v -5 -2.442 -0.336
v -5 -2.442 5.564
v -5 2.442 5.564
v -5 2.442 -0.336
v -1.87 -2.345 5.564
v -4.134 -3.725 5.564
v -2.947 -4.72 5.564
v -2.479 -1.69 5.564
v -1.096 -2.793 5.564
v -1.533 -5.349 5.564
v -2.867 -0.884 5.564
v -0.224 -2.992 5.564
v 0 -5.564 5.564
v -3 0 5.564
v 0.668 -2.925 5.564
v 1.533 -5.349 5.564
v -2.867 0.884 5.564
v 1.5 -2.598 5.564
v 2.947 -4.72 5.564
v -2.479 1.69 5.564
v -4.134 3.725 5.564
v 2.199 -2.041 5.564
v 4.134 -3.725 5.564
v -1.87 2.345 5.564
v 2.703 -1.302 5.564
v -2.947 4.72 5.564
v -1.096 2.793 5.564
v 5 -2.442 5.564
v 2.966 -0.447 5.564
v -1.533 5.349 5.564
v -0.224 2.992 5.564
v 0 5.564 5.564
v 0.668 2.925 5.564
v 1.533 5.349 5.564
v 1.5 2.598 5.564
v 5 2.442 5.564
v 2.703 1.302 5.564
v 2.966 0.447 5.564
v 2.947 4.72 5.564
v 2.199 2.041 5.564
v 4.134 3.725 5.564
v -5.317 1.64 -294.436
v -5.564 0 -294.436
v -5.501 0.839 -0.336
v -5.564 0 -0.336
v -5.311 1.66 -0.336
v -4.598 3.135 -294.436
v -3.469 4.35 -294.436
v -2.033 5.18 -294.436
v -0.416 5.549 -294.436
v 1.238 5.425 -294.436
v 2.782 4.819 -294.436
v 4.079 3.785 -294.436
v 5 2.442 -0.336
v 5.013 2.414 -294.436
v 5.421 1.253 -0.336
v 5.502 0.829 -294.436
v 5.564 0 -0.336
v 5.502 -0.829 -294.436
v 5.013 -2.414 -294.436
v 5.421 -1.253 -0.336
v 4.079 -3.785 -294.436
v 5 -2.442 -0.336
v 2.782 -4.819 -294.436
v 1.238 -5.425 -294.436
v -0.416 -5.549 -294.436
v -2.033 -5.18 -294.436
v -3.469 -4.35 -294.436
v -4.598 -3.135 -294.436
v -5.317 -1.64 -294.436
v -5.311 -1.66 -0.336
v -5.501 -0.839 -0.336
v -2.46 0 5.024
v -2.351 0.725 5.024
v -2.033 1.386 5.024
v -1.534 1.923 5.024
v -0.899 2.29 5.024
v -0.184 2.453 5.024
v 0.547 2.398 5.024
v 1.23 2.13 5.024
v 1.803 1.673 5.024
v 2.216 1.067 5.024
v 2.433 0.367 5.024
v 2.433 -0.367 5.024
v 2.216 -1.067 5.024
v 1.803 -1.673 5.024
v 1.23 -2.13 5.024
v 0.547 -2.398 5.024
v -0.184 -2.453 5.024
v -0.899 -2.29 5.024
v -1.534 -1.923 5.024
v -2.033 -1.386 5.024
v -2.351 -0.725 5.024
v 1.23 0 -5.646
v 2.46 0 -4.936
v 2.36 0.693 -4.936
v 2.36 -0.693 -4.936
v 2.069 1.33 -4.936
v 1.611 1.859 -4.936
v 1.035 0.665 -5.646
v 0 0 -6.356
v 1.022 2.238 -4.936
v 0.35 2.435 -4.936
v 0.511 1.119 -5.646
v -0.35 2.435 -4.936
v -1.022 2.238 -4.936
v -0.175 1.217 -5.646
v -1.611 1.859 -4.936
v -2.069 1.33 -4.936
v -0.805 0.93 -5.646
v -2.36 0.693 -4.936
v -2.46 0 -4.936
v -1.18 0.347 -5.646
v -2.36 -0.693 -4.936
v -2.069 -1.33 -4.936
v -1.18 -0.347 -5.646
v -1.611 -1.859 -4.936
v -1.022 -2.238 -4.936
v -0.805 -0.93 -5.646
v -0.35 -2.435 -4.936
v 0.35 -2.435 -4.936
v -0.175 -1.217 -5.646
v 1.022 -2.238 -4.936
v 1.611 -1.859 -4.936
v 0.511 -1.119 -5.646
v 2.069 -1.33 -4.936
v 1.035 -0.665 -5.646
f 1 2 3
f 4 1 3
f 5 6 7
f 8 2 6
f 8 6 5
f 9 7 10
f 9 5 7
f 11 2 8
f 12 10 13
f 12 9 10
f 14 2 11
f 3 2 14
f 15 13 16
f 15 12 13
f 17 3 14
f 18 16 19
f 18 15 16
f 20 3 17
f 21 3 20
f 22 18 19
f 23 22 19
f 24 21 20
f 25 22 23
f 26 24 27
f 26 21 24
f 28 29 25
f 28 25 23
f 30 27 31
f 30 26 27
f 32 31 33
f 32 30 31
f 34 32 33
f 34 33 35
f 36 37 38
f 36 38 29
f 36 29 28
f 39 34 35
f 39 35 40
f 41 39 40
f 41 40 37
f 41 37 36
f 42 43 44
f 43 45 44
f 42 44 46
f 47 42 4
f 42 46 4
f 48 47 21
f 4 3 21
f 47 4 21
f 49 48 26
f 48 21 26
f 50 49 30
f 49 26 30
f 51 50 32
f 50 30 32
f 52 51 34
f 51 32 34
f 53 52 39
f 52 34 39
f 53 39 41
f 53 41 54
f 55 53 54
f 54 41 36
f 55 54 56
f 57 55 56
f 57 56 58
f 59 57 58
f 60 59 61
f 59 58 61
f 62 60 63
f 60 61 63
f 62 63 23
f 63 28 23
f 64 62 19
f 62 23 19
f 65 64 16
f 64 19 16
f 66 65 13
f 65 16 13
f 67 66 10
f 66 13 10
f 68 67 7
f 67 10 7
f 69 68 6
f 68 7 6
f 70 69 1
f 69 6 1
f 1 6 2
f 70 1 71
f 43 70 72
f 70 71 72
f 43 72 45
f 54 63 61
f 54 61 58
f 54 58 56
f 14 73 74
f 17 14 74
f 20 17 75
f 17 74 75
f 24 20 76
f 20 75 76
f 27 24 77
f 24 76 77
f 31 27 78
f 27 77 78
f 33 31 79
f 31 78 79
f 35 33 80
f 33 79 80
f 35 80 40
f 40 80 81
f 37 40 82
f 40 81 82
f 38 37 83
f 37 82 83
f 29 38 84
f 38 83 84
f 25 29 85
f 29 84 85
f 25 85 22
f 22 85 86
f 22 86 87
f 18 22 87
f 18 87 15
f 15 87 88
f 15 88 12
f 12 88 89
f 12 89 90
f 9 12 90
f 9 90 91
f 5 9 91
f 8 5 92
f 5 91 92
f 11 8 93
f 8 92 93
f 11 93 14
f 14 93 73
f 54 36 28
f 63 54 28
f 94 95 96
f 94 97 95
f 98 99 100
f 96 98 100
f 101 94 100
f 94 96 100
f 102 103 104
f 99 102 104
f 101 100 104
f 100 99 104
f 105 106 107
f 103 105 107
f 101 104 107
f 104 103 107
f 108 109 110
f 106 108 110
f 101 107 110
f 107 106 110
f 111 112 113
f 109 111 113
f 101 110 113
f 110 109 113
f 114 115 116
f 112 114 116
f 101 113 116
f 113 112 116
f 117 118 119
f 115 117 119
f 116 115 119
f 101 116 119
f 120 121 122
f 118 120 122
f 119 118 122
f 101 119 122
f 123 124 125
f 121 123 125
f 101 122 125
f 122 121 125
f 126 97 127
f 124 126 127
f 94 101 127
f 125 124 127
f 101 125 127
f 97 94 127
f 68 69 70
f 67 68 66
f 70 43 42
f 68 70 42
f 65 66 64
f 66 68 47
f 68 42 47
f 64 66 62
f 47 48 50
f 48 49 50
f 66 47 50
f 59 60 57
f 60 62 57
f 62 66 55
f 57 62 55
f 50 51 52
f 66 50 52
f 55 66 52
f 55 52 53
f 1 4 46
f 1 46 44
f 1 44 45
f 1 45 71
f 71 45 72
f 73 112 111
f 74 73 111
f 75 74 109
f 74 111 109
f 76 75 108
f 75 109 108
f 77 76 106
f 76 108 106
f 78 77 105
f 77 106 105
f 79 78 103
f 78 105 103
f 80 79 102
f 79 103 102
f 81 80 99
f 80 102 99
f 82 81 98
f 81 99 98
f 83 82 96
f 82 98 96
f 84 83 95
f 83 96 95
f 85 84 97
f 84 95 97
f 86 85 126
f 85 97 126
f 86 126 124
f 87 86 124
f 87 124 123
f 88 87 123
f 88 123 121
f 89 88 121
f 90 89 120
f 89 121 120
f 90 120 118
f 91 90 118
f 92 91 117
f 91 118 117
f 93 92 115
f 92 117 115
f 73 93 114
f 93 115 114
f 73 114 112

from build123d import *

# Parameters (mm, degrees)
SKETCH1_W          = 5.564434946
SKETCH1_H          = 300
CUT_EXTRUDE1_DEPTH = 5.9
CUT_EXTRUDE2_DEPTH = 5.9
HOLE1_D            = 4.92
HOLE1_DEPTH        = 10.5
HOLE1_TIP          = 1.420281662
CHAMFER2_SIZE      = 0.54


with BuildPart() as part:
    # Sketch1 → Revolve1 (revolve)
    with BuildSketch(Plane.XZ, mode=Mode.PRIVATE) as revolve1_sk:
        with Locations((2.782217473, -144.435565054)):
            Rectangle(SKETCH1_W, SKETCH1_H)
    revolve(revolve1_sk.sketch.rotate(Axis((0, 0, 5.564434946), (0, 0, -1)), 180), axis=Axis((0, 0, 5.564434946), (0, 0, -1)))

    # Sketch2 → Cut-Extrude1 (cut)
    with BuildSketch(Plane.XY.offset(5.564434946)):
        with BuildLine():
            Line((-5, -3.31662479), (-5, 3.31662479))
            ThreePointArc((-5, 3.31662479), (-6, 0), (-5, -3.31662479))
        make_face()
    extrude(amount=-CUT_EXTRUDE1_DEPTH, mode=Mode.SUBTRACT)

    # Sketch3 → Cut-Extrude2 (cut)
    with BuildSketch(Plane.XY.offset(5.564434946)):
        with BuildLine():
            Line((5, 3.31662479), (5, -3.31662479))
            ThreePointArc((5, -3.31662479), (6, 0), (5, 3.31662479))
        make_face()
    extrude(amount=-CUT_EXTRUDE2_DEPTH, mode=Mode.SUBTRACT)

    # Hole1
    with Locations(Plane.XY.offset(5.564434946)):
        with Locations((0, 0)):
            Hole(HOLE1_D / 2, depth=HOLE1_DEPTH)
            with Locations((0, 0, -(HOLE1_DEPTH + HOLE1_TIP / 2))):  # 120° drill point
                Cone(0, HOLE1_D / 2, HOLE1_TIP, mode=Mode.SUBTRACT)

    # Chamfer2
    chamfer2_edges = [part.edges().sort_by_distance(p)[0] for p in [
        (2.46, 0, 5.564434946),
    ]]
    chamfer(chamfer2_edges, length=CHAMFER2_SIZE)


solid = part.part
